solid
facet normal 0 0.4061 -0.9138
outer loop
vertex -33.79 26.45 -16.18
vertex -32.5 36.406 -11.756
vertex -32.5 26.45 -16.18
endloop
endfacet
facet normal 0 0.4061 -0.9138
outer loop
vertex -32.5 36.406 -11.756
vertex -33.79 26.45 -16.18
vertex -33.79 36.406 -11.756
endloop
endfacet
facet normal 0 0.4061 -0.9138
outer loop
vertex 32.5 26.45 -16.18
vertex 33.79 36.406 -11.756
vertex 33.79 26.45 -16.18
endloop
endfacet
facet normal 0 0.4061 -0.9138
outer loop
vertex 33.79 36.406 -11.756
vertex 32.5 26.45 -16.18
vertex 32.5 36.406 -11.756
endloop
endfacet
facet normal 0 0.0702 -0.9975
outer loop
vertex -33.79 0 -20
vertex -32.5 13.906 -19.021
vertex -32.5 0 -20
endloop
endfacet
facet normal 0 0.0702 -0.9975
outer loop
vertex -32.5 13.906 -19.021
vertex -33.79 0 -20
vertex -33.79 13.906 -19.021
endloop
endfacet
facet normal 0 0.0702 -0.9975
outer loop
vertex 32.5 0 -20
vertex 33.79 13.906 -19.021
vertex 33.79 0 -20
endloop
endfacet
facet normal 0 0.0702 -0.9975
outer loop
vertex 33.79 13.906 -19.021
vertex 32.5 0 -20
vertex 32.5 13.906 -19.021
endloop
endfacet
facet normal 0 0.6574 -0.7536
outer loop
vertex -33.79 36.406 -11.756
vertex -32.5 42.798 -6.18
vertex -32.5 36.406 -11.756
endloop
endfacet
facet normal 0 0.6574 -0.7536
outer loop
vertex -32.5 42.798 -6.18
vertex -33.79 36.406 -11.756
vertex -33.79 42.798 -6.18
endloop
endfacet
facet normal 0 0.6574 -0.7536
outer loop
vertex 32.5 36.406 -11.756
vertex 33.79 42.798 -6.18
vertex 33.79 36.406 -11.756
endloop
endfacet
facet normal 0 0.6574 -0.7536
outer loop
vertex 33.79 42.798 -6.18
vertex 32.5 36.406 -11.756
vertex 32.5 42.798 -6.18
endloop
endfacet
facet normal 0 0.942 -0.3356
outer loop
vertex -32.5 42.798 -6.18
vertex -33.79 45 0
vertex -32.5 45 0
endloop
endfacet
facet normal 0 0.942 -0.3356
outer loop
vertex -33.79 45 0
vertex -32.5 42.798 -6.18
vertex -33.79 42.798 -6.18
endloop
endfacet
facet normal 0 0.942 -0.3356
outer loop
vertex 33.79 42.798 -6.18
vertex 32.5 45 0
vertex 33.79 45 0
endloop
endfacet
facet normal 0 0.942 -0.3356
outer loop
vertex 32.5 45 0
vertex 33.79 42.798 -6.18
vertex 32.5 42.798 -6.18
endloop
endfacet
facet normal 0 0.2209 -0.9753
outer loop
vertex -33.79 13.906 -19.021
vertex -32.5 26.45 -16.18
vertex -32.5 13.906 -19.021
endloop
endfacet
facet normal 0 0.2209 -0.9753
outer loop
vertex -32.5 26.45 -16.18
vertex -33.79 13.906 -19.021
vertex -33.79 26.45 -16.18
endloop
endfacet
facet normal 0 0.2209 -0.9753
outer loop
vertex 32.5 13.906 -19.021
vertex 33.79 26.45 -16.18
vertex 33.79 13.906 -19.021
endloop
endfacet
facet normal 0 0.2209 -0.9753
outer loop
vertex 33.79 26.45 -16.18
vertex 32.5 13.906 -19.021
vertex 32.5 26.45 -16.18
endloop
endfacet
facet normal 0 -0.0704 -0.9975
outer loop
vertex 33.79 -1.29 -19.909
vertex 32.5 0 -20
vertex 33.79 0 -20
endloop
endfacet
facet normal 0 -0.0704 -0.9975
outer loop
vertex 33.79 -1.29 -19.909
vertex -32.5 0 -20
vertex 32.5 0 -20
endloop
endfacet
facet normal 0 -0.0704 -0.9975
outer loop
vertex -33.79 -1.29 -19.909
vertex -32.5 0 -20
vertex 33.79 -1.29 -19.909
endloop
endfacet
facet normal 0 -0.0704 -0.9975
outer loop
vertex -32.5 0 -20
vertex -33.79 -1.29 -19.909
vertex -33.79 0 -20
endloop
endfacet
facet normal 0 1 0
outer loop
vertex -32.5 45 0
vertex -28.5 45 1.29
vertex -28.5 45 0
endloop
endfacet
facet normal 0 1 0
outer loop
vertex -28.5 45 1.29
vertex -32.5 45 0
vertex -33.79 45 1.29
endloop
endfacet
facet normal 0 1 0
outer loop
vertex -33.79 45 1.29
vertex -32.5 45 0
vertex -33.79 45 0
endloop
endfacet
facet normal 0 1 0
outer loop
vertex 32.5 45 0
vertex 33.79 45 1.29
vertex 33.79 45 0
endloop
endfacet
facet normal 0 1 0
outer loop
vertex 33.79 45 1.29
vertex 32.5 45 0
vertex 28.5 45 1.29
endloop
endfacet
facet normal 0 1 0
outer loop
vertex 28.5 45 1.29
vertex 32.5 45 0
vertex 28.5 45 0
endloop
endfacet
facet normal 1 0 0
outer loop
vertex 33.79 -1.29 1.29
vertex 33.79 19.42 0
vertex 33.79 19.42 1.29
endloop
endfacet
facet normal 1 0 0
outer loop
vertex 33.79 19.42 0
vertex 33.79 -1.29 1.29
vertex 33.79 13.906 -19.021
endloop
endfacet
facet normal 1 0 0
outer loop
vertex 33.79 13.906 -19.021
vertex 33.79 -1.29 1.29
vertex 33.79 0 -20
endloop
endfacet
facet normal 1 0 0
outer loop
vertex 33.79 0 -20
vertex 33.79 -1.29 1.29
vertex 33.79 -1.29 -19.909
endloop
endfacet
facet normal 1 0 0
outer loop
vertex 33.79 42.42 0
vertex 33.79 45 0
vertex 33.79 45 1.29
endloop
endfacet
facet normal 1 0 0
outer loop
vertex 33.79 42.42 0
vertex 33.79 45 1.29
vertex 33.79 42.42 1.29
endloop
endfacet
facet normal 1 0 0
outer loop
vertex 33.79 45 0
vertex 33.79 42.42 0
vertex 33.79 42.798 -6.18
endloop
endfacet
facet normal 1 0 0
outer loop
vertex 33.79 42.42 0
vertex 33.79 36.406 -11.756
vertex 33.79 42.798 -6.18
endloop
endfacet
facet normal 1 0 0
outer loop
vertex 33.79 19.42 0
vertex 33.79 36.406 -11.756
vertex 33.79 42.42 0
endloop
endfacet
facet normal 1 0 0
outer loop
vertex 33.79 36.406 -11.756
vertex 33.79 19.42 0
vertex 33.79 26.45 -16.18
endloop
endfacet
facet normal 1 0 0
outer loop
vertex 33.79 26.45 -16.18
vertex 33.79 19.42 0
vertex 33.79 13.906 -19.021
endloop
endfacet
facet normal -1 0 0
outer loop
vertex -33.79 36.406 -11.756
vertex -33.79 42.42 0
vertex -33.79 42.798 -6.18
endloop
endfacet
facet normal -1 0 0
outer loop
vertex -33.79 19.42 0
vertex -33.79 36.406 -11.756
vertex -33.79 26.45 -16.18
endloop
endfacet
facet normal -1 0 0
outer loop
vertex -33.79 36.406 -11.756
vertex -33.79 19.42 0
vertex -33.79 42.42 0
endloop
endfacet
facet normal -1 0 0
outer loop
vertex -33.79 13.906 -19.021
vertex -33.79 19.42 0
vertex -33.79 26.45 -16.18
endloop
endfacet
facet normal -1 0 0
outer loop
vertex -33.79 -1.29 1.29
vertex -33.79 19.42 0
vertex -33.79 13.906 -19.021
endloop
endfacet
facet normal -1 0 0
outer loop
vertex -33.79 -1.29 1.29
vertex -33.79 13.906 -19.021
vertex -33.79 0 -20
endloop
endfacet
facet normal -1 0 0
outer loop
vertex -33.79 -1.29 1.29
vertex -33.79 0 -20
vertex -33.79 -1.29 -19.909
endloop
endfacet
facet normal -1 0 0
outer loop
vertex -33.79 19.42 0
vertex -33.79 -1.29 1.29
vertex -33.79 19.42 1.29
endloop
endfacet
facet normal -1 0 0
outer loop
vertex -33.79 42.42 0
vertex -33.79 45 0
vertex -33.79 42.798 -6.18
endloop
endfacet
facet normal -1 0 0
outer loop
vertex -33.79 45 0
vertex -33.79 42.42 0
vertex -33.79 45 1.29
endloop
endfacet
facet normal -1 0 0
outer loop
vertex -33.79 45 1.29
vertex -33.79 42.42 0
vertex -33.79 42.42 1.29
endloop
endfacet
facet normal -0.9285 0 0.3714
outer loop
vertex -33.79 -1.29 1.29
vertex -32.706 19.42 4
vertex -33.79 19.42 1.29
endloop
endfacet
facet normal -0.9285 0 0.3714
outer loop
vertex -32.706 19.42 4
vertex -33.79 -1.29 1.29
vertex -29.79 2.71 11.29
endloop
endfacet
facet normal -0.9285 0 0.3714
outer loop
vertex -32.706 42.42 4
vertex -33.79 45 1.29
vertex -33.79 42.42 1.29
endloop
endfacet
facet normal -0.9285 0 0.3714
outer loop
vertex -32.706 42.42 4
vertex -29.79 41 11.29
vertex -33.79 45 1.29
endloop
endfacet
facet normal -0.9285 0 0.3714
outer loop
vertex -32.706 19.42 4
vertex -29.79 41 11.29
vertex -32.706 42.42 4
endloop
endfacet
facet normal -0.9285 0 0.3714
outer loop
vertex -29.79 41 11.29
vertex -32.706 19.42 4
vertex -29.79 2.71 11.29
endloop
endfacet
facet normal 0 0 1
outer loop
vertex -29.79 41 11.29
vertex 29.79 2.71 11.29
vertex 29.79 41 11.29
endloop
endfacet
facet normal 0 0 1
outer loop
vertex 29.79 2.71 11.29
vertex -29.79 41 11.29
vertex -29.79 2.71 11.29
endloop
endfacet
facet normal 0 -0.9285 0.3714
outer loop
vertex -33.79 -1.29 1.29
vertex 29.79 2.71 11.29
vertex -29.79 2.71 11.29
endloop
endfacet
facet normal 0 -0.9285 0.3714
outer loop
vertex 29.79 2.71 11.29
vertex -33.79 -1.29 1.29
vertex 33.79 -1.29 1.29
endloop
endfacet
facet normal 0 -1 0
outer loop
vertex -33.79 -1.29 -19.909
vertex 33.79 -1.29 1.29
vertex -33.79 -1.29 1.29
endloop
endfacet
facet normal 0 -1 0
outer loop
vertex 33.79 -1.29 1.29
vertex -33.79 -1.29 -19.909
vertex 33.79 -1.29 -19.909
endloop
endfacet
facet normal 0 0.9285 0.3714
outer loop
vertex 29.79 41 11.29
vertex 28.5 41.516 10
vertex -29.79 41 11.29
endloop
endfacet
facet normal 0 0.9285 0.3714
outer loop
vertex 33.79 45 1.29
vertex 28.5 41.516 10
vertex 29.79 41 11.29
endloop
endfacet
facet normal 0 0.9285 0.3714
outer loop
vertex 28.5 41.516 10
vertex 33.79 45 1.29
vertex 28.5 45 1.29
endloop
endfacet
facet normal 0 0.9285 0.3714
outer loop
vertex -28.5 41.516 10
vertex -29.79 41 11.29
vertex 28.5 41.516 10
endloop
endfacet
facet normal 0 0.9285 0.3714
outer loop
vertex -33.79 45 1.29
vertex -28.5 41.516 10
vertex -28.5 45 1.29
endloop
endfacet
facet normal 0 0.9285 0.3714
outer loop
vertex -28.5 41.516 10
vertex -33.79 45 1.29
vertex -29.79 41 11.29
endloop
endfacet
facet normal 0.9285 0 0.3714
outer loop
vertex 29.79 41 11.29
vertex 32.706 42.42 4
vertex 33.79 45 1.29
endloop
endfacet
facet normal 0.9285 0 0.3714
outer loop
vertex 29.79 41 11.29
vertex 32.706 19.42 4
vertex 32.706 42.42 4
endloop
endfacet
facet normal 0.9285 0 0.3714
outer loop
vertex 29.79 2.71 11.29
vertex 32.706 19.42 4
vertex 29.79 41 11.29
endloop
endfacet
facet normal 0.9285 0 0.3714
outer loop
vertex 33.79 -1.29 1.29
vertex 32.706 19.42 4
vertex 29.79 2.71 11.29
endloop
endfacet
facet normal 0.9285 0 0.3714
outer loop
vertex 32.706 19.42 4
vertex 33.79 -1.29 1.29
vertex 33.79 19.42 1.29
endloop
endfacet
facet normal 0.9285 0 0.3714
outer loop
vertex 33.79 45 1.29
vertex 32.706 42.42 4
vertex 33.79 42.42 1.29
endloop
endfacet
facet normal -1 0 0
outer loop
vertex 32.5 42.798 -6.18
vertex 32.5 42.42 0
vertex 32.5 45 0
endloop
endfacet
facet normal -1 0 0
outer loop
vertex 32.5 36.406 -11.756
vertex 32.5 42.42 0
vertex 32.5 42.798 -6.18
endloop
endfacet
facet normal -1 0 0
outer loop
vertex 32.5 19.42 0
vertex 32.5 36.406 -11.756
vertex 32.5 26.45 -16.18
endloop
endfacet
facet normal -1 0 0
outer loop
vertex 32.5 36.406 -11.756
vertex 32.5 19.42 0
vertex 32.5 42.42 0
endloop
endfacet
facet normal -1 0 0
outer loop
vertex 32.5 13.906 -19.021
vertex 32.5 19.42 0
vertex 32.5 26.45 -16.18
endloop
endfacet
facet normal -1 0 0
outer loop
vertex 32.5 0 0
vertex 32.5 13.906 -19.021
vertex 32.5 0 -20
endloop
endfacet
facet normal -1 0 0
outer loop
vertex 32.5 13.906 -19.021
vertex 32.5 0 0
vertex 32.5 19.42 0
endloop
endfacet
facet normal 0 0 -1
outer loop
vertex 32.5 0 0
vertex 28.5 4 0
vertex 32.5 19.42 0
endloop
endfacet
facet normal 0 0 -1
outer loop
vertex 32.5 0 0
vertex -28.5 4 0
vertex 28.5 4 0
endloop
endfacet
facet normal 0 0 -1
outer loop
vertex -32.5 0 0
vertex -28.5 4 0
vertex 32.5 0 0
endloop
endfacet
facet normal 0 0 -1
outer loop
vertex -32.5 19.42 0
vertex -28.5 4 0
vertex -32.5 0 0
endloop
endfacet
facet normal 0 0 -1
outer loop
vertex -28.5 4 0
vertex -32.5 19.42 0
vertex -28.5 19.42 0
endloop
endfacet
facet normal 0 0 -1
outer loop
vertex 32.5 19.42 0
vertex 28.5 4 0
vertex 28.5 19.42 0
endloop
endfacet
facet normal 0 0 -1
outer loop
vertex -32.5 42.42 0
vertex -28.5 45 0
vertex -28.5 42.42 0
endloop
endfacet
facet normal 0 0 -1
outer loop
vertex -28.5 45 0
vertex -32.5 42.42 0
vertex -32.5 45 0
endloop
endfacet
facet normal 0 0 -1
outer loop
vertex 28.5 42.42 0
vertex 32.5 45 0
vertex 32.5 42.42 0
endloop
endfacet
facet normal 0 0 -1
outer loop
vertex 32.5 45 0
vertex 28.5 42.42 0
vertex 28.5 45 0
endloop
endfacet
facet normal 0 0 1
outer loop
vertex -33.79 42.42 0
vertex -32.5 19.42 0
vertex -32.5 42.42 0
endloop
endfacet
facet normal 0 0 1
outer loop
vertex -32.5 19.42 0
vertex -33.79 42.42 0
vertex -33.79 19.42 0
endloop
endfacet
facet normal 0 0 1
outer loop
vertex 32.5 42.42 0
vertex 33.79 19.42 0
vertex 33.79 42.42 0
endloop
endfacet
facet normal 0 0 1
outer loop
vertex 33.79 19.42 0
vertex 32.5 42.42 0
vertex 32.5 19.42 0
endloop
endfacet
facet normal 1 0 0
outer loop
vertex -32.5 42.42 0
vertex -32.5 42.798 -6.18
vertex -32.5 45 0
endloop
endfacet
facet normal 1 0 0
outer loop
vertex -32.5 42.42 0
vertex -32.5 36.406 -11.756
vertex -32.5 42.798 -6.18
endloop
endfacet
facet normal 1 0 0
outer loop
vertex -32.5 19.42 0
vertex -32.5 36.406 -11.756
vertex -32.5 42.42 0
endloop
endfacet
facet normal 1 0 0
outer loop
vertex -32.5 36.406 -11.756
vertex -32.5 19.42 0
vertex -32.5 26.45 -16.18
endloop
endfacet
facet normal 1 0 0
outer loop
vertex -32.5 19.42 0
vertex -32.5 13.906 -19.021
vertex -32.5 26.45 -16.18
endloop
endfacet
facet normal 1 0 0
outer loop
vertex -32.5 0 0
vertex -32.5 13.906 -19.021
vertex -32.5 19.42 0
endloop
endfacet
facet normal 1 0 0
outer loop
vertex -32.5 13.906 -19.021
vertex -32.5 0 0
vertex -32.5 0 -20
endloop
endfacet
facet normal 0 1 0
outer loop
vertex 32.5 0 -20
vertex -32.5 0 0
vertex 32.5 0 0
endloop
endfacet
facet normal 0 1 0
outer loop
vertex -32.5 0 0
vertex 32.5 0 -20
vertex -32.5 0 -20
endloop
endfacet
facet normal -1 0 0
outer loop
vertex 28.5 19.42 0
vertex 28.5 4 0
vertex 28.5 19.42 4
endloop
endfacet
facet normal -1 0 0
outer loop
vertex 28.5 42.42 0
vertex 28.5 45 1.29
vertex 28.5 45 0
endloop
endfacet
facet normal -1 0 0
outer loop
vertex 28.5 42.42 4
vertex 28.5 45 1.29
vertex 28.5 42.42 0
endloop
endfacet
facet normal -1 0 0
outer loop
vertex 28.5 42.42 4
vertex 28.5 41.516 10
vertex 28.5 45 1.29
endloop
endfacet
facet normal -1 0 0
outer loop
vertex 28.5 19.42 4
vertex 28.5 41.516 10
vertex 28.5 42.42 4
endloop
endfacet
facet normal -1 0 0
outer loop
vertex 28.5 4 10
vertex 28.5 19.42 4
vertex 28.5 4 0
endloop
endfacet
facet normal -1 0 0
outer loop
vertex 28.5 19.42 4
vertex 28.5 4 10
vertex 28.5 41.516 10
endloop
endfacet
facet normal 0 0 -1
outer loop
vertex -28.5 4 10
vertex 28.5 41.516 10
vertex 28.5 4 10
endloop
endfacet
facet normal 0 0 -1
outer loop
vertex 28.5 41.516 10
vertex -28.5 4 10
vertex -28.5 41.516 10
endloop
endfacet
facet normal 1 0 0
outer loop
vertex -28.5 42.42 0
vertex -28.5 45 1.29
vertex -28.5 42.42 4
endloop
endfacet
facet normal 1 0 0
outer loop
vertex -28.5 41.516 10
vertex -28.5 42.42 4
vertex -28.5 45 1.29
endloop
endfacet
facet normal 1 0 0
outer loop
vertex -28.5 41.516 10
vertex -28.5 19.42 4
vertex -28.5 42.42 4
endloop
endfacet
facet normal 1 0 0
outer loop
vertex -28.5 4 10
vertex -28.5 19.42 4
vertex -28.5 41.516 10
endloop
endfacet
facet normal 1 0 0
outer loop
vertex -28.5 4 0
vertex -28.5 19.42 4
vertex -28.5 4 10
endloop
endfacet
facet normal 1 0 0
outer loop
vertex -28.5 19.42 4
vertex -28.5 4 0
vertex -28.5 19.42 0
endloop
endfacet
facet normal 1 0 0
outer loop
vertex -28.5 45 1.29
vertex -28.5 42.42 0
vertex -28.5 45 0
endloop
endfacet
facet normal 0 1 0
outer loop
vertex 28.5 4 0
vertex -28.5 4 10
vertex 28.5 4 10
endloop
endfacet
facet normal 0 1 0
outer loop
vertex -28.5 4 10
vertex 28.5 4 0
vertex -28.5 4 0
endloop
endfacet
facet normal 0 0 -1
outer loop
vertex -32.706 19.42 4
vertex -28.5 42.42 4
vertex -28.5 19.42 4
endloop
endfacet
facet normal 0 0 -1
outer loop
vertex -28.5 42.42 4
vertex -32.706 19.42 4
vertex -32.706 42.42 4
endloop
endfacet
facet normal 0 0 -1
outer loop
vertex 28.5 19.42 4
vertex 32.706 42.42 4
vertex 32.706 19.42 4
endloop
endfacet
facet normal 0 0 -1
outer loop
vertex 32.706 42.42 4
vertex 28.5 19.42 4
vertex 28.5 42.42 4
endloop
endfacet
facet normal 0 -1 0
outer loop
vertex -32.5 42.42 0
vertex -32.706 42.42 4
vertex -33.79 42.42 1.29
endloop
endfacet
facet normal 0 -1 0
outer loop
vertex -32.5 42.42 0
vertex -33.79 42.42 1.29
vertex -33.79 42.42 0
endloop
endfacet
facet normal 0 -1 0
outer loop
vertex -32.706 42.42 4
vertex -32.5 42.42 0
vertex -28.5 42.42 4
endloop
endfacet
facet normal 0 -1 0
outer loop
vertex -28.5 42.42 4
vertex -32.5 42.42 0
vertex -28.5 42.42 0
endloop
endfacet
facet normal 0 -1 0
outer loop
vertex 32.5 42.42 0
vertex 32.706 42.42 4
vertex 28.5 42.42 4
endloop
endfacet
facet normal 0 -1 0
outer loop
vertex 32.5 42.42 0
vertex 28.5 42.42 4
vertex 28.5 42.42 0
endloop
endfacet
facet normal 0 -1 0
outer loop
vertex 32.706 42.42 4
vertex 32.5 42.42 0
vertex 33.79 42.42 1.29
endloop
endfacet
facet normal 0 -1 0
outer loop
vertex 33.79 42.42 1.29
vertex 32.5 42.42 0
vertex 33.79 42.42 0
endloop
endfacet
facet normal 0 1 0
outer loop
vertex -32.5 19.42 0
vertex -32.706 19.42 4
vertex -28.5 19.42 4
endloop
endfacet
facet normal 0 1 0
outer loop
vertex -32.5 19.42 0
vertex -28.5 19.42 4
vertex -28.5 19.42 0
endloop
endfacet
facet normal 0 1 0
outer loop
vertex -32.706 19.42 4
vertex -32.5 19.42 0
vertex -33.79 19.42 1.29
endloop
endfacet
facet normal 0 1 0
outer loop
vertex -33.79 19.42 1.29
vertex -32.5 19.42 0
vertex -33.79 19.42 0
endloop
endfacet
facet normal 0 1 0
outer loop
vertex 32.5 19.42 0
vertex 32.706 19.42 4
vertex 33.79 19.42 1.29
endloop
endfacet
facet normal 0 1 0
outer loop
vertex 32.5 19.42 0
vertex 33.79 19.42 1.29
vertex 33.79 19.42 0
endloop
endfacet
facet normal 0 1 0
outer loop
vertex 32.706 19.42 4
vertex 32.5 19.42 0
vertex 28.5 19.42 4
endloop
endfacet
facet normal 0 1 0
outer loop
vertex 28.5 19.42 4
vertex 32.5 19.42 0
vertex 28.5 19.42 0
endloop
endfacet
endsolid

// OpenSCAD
// Size of the battery in the direction parallel to the pair of terminals, in millimeters. Usually the smallest dimension.
inside_width = 65;

// Size of the cover in the direction the wires will come out (towards the middle of the battery), in millimeters. Non-critical.
inside_length = 45;

// Size of the cover vertically (should be less than the height of the battery), in millimeters.
inside_height = 20;

// Amount of vertical space to allow for the wires and terminals, in millimeters.
wiring_height = 10;

cover_thickness = 1.29;

strap_slot_width = 23;

strap_slot_height = 4;

/* [Hidden] */

// Closest approach of any terminal (with fastened connector) to the edges of the top of the battery. Used to set the lip around the top of the cap.
terminal_edge = 4;

epsilon = 0.01;


main();


module main() {
    difference() {
        intersection() {
            translate([-inside_width / 2, 0, 0])
            hull() {
                // Main cap box
                translate([-cover_thickness, -cover_thickness, -inside_height])
                cube([inside_width + cover_thickness * 2, inside_length + cover_thickness, inside_height +
     cover_thickness]);
                
                // Cover above terminals
                translate([terminal_edge - cover_thickness, terminal_edge - cover_thickness, wiring_height])
                cube([inside_width - terminal_edge * 2 + cover_thickness * 2, inside_length - terminal_edge * 2 + cover_thickness, cover_thickness]);
            }
            
            // Corner rounding
            union() {
                scale([1, inside_length, inside_height])
                rotate([0, 90, 0])
                cylinder(r=1, h=1000, center=true, $fn = 20);
                
                translate([-500, 0, 0]) 
                cube([1000, inside_length, 1000]);
            }
        }
        
        battery_model();
        
        // Interior space for terminals/wiring
        translate([-inside_width / 2 + terminal_edge, terminal_edge, -epsilon])
        cube([inside_width - terminal_edge * 2, 1000, wiring_height + epsilon]);
        
        // Tie-down strap
        translate([-500, inside_length - cover_thickness * 2 - strap_slot_width, 0])
        cube([1000, strap_slot_width, strap_slot_height]);
    }
    
    %battery_model();
}

module battery_model() {
    translate([-inside_width / 2, 0, -inside_height * 4])
    cube([inside_width, inside_length * 3, inside_height * 4]);
}
